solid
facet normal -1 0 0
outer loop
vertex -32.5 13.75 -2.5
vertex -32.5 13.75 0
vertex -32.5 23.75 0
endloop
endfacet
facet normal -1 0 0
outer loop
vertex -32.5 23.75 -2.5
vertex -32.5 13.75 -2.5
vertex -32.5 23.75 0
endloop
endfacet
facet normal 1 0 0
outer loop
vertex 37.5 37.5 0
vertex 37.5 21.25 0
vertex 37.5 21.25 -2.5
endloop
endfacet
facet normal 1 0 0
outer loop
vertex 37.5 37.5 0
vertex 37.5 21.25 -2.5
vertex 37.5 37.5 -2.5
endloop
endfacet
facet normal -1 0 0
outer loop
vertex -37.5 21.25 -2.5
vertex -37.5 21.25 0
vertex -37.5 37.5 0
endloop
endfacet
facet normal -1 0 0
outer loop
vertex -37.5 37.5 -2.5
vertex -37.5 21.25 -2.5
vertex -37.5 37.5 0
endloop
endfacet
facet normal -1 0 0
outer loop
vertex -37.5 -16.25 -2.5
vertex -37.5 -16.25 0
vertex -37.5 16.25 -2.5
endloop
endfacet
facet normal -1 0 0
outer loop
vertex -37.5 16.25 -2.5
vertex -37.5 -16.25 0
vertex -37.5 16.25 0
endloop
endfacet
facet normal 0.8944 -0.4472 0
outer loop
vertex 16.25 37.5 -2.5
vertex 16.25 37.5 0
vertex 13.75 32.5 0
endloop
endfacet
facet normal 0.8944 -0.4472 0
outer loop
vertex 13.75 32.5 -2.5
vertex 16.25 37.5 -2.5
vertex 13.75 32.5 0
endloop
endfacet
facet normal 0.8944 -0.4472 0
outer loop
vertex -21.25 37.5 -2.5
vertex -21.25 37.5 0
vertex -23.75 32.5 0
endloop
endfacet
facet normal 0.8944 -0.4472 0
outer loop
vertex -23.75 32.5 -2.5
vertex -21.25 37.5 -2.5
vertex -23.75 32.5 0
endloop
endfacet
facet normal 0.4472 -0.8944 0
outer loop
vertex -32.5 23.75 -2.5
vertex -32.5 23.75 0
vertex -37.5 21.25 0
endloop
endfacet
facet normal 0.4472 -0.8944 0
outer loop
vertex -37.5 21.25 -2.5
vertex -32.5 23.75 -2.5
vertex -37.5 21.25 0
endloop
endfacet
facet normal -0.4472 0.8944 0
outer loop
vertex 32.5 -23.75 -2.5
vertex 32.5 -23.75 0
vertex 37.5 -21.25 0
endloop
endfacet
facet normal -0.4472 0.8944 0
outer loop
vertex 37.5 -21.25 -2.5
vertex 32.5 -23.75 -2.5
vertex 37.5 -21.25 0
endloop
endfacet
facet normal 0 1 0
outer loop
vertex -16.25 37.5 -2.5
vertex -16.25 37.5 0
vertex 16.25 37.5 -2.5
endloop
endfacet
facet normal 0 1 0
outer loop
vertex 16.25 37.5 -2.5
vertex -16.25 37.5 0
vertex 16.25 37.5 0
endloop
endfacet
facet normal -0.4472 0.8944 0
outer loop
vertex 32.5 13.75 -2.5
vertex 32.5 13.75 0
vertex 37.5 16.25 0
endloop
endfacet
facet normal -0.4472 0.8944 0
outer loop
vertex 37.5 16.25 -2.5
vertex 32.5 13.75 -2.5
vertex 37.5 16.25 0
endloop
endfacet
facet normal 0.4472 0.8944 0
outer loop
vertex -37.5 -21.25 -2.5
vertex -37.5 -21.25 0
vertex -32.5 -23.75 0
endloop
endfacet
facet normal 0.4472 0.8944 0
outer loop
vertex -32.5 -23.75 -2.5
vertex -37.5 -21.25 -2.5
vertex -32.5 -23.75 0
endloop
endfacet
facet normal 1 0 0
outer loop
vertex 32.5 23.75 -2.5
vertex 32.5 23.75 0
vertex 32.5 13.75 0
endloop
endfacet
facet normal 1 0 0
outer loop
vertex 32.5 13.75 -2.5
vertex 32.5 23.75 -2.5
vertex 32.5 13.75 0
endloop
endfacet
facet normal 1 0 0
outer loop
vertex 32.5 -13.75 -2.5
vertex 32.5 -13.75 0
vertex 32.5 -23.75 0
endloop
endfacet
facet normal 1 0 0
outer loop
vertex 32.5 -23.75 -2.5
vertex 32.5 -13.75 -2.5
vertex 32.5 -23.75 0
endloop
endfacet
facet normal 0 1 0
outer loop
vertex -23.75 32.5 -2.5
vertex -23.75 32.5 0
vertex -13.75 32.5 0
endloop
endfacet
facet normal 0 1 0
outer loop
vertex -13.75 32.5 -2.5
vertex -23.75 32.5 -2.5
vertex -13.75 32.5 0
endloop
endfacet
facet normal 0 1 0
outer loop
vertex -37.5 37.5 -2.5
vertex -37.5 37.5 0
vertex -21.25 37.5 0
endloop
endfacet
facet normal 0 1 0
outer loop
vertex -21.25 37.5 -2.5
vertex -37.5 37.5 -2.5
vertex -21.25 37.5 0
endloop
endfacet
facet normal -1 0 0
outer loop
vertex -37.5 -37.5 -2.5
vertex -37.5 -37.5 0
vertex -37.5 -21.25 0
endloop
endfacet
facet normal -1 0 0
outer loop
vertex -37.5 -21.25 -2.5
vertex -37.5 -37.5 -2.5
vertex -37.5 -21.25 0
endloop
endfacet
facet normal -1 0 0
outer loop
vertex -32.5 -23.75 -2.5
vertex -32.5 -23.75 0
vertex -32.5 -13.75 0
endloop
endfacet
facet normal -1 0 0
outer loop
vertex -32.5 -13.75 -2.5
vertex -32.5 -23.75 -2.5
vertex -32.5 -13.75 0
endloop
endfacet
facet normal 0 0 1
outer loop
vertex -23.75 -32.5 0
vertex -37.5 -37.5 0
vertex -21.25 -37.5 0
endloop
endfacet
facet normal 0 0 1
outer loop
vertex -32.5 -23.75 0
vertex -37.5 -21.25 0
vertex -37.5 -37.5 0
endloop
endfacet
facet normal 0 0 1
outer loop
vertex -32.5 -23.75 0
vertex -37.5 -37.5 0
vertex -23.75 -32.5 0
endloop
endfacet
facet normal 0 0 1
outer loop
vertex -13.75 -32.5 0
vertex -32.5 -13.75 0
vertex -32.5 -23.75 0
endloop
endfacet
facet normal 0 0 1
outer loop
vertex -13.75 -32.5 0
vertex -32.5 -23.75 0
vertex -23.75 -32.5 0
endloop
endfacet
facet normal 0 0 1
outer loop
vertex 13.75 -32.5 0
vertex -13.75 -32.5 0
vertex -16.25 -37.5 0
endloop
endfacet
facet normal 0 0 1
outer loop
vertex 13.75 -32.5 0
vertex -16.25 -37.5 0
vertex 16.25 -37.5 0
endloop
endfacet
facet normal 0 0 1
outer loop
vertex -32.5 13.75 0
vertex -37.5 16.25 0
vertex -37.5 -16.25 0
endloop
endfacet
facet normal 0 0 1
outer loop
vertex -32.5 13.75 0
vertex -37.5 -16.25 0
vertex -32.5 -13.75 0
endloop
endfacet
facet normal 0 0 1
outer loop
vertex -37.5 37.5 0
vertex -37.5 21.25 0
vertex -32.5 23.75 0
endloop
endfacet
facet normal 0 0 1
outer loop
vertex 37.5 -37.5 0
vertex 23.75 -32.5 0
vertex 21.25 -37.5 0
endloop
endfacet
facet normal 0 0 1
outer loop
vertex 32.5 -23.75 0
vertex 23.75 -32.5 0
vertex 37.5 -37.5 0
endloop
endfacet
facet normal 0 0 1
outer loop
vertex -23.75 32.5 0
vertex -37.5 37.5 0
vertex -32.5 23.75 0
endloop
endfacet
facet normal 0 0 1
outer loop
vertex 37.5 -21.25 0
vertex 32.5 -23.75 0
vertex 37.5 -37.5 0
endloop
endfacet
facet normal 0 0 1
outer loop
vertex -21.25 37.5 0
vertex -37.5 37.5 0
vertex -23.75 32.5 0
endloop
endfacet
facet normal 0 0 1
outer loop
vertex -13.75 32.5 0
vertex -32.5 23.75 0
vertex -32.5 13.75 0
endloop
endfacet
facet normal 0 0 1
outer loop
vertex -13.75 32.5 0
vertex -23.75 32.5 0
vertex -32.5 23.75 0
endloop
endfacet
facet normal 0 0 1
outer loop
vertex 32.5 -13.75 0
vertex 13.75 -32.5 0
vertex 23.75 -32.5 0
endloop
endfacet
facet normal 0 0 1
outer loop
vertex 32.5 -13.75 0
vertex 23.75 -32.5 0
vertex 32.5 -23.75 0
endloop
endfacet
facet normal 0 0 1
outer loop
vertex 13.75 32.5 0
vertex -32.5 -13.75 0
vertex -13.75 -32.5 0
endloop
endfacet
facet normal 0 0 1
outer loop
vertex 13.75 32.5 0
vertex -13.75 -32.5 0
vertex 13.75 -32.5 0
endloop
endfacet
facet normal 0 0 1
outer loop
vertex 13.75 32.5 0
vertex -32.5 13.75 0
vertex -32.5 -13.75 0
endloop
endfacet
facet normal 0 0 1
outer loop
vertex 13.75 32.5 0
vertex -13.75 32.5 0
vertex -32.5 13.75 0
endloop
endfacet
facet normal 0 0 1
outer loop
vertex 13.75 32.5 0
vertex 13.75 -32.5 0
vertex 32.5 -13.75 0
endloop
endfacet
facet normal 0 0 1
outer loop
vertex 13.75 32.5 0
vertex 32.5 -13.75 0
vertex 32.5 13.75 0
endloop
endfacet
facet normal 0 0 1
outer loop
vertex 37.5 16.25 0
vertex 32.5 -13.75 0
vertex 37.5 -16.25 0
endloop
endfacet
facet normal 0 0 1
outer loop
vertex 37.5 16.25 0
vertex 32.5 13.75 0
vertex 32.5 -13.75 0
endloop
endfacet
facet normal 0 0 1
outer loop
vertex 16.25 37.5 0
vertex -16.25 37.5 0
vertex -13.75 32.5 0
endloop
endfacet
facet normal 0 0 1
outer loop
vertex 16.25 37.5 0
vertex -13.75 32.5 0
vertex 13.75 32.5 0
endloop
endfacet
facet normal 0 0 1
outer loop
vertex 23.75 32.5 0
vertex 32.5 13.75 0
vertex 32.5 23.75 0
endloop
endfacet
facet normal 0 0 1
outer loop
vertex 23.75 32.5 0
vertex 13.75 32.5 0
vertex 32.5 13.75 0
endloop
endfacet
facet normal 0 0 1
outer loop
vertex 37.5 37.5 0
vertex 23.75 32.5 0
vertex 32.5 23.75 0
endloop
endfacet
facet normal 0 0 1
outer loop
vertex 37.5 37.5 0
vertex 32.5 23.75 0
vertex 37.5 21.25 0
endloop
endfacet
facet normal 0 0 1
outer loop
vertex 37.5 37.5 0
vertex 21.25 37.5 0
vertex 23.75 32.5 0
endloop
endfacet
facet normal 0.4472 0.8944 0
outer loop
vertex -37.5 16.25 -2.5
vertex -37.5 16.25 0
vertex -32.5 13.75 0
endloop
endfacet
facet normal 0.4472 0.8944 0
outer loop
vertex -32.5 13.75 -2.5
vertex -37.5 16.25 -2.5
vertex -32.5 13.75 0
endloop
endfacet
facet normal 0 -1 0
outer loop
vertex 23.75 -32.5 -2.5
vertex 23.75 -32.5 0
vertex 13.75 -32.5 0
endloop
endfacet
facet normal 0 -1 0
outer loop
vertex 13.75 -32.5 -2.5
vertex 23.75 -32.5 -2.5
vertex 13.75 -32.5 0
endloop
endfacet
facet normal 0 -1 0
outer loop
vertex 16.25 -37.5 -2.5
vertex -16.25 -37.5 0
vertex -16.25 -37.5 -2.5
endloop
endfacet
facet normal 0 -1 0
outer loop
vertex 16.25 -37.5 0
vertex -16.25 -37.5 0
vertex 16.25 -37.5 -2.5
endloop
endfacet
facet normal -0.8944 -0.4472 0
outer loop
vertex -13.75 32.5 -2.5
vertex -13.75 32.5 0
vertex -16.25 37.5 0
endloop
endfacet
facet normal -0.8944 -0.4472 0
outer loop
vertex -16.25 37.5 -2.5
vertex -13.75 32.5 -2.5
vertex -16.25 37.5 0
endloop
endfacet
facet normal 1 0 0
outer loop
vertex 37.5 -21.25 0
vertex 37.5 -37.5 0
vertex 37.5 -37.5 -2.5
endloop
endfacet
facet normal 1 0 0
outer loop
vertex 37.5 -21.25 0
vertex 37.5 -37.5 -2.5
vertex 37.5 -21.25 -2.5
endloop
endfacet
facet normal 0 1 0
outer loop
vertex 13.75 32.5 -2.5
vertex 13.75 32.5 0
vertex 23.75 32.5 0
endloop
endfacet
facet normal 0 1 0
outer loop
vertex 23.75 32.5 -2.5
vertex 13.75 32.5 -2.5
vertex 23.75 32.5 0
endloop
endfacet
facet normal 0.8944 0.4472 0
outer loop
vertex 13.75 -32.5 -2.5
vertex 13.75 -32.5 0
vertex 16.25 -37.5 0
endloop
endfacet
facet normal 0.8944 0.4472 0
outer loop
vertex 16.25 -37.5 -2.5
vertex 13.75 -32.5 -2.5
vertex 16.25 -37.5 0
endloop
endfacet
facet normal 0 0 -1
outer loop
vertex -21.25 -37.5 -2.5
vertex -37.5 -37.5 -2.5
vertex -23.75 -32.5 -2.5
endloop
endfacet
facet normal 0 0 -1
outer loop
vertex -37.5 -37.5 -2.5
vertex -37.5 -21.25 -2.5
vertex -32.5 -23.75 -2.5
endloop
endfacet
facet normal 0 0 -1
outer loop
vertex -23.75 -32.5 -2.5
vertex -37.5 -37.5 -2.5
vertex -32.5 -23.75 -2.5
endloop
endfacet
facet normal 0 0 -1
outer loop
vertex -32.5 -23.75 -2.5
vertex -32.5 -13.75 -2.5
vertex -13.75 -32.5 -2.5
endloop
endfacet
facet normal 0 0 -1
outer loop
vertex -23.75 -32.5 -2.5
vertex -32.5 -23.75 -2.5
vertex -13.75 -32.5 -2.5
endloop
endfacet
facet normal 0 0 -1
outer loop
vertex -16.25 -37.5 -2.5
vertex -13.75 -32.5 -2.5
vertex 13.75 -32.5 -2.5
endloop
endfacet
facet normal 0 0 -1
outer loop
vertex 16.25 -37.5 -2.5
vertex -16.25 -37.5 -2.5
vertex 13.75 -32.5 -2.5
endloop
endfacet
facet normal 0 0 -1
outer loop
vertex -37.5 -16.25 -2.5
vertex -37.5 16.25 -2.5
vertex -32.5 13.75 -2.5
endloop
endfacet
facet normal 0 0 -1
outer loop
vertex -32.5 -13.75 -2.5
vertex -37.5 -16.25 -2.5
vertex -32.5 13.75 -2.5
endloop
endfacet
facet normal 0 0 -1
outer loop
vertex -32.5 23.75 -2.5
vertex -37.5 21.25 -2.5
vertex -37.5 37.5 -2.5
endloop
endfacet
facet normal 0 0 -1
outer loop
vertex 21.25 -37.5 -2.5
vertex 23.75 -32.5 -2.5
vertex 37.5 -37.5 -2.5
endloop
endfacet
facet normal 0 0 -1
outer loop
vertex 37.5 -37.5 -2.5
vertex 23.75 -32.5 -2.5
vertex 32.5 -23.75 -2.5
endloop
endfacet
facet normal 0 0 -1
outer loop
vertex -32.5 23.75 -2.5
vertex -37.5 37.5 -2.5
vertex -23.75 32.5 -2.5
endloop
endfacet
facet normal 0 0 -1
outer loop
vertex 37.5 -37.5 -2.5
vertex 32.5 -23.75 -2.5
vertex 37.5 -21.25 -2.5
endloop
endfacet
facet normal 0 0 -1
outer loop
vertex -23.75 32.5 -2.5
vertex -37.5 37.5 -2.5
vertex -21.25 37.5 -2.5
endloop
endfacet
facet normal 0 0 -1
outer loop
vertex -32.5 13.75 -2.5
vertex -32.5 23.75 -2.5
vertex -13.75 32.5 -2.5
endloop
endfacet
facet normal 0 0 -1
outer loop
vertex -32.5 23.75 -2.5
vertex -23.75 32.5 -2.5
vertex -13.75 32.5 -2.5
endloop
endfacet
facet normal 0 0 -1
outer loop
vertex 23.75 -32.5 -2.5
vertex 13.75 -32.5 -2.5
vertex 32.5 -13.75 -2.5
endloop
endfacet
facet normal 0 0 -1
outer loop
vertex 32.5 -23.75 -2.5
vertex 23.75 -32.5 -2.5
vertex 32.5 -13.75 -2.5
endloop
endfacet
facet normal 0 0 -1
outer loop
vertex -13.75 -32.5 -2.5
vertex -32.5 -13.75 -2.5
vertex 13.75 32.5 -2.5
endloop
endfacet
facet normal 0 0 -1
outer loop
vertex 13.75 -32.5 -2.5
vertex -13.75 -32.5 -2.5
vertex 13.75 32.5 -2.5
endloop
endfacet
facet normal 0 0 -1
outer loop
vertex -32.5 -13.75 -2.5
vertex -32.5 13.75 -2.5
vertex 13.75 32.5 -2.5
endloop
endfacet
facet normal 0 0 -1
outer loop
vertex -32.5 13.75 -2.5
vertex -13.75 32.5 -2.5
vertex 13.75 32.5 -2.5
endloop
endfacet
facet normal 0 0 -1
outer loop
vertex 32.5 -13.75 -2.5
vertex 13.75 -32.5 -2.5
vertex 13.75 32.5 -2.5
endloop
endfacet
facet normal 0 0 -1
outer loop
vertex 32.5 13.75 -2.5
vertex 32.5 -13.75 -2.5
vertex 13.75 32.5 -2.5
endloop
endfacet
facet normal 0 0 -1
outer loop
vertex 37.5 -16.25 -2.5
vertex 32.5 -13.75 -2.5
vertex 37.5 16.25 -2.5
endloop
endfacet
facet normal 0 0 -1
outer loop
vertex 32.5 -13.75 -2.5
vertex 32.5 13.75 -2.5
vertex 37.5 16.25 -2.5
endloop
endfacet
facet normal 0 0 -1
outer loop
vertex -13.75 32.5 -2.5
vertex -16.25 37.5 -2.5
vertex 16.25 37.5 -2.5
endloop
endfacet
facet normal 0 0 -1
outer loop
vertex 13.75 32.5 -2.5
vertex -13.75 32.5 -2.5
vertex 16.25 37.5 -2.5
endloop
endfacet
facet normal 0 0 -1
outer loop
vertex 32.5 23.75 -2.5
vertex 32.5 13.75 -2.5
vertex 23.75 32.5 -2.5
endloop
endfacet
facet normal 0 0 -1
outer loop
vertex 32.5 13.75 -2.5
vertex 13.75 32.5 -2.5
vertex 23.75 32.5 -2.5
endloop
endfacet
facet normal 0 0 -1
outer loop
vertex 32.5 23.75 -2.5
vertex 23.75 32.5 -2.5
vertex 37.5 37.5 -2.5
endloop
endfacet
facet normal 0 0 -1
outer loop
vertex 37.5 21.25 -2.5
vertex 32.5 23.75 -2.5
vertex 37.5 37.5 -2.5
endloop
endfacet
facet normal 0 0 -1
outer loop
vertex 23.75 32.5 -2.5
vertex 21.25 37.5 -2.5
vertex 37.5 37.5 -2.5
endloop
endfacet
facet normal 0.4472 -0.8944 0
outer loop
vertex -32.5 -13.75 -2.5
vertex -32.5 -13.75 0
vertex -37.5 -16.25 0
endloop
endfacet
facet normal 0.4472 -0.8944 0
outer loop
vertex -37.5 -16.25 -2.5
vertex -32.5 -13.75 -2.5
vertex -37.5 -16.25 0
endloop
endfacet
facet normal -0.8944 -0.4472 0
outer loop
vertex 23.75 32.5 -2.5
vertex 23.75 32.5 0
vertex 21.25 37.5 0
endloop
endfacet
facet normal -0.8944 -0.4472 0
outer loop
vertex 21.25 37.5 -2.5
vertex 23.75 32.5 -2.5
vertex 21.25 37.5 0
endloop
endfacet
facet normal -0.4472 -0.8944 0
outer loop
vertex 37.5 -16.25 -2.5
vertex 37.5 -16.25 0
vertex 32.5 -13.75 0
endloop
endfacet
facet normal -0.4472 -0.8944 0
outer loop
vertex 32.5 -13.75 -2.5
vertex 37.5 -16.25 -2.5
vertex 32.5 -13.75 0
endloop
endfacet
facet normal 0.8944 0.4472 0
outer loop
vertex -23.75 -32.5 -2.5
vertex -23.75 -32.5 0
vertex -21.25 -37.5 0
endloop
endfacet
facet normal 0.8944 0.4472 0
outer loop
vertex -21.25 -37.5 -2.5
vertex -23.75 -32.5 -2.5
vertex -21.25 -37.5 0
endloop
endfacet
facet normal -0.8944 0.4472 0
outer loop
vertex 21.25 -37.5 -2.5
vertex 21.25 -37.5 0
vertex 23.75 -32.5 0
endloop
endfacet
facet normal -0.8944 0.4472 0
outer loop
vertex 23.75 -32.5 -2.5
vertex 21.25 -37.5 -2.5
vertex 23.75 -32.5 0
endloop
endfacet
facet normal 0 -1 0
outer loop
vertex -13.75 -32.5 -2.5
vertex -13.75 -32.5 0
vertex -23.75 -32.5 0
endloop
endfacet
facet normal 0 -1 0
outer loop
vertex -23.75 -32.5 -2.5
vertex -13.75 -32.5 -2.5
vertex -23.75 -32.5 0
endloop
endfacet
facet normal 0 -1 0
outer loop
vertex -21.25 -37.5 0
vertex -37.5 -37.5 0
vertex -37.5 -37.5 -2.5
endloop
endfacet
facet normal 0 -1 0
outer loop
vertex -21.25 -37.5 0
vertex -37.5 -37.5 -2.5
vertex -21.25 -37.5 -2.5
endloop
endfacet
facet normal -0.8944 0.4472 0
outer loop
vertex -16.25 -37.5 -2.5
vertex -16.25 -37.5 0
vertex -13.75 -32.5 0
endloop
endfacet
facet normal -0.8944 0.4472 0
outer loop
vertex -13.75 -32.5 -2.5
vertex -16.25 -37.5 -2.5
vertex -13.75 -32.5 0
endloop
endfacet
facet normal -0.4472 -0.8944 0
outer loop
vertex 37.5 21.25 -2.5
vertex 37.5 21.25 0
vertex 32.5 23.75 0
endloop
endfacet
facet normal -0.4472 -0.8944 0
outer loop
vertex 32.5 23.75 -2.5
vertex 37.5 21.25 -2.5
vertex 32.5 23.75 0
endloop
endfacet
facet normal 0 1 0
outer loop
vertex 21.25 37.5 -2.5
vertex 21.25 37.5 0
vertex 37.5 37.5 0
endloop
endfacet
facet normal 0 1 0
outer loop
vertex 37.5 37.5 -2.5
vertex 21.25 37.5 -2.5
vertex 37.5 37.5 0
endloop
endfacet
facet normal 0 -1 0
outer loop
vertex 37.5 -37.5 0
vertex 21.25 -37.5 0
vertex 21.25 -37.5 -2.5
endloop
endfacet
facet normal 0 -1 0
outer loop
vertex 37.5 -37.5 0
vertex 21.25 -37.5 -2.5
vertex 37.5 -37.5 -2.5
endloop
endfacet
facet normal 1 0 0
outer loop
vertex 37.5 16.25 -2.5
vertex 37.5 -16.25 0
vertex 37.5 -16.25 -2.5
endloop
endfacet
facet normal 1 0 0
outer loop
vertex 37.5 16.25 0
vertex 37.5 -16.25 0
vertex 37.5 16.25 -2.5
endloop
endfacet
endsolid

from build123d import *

# Parameters (mm, degrees)
F0_W     = 75
F0_H     = 75
F1_DEPTH = 2.5
F3_DEPTH = 2.5


with BuildPart() as f1:
    # F0 (on Top) → F1 (new body)
    with BuildSketch(Plane.XY):
        Rectangle(F0_W, F0_H)
    extrude(amount=-F1_DEPTH)

    # F2 (on Top) → F3 (cut, through all)
    with BuildSketch(Plane.XY):
        Polygon((-32.5, 13.75), (-32.5, 23.75), (-37.5, 21.25), (-37.5, 16.25), align=None)
        Polygon((-32.5, -13.75), (-37.5, -16.25), (-37.5, -21.25), (-32.5, -23.75), align=None)
        Polygon((37.5, 21.25), (32.5, 23.75), (32.5, 13.75), (37.5, 16.25), align=None)
        Polygon((32.5, -13.75), (32.5, -23.75), (37.5, -21.25), (37.5, -16.25), align=None)
        Polygon((-16.25, 37.5), (-21.25, 37.5), (-23.75, 32.5), (-13.75, 32.5), align=None)
        Polygon((21.25, 37.5), (16.25, 37.5), (13.75, 32.5), (23.75, 32.5), align=None)
        Polygon((-13.75, -32.5), (-23.75, -32.5), (-21.25, -37.5), (-16.25, -37.5), align=None)
        Polygon((16.25, -37.5), (21.25, -37.5), (23.75, -32.5), (13.75, -32.5), align=None)
    extrude(amount=-F3_DEPTH, mode=Mode.SUBTRACT)


solid = f1.part
